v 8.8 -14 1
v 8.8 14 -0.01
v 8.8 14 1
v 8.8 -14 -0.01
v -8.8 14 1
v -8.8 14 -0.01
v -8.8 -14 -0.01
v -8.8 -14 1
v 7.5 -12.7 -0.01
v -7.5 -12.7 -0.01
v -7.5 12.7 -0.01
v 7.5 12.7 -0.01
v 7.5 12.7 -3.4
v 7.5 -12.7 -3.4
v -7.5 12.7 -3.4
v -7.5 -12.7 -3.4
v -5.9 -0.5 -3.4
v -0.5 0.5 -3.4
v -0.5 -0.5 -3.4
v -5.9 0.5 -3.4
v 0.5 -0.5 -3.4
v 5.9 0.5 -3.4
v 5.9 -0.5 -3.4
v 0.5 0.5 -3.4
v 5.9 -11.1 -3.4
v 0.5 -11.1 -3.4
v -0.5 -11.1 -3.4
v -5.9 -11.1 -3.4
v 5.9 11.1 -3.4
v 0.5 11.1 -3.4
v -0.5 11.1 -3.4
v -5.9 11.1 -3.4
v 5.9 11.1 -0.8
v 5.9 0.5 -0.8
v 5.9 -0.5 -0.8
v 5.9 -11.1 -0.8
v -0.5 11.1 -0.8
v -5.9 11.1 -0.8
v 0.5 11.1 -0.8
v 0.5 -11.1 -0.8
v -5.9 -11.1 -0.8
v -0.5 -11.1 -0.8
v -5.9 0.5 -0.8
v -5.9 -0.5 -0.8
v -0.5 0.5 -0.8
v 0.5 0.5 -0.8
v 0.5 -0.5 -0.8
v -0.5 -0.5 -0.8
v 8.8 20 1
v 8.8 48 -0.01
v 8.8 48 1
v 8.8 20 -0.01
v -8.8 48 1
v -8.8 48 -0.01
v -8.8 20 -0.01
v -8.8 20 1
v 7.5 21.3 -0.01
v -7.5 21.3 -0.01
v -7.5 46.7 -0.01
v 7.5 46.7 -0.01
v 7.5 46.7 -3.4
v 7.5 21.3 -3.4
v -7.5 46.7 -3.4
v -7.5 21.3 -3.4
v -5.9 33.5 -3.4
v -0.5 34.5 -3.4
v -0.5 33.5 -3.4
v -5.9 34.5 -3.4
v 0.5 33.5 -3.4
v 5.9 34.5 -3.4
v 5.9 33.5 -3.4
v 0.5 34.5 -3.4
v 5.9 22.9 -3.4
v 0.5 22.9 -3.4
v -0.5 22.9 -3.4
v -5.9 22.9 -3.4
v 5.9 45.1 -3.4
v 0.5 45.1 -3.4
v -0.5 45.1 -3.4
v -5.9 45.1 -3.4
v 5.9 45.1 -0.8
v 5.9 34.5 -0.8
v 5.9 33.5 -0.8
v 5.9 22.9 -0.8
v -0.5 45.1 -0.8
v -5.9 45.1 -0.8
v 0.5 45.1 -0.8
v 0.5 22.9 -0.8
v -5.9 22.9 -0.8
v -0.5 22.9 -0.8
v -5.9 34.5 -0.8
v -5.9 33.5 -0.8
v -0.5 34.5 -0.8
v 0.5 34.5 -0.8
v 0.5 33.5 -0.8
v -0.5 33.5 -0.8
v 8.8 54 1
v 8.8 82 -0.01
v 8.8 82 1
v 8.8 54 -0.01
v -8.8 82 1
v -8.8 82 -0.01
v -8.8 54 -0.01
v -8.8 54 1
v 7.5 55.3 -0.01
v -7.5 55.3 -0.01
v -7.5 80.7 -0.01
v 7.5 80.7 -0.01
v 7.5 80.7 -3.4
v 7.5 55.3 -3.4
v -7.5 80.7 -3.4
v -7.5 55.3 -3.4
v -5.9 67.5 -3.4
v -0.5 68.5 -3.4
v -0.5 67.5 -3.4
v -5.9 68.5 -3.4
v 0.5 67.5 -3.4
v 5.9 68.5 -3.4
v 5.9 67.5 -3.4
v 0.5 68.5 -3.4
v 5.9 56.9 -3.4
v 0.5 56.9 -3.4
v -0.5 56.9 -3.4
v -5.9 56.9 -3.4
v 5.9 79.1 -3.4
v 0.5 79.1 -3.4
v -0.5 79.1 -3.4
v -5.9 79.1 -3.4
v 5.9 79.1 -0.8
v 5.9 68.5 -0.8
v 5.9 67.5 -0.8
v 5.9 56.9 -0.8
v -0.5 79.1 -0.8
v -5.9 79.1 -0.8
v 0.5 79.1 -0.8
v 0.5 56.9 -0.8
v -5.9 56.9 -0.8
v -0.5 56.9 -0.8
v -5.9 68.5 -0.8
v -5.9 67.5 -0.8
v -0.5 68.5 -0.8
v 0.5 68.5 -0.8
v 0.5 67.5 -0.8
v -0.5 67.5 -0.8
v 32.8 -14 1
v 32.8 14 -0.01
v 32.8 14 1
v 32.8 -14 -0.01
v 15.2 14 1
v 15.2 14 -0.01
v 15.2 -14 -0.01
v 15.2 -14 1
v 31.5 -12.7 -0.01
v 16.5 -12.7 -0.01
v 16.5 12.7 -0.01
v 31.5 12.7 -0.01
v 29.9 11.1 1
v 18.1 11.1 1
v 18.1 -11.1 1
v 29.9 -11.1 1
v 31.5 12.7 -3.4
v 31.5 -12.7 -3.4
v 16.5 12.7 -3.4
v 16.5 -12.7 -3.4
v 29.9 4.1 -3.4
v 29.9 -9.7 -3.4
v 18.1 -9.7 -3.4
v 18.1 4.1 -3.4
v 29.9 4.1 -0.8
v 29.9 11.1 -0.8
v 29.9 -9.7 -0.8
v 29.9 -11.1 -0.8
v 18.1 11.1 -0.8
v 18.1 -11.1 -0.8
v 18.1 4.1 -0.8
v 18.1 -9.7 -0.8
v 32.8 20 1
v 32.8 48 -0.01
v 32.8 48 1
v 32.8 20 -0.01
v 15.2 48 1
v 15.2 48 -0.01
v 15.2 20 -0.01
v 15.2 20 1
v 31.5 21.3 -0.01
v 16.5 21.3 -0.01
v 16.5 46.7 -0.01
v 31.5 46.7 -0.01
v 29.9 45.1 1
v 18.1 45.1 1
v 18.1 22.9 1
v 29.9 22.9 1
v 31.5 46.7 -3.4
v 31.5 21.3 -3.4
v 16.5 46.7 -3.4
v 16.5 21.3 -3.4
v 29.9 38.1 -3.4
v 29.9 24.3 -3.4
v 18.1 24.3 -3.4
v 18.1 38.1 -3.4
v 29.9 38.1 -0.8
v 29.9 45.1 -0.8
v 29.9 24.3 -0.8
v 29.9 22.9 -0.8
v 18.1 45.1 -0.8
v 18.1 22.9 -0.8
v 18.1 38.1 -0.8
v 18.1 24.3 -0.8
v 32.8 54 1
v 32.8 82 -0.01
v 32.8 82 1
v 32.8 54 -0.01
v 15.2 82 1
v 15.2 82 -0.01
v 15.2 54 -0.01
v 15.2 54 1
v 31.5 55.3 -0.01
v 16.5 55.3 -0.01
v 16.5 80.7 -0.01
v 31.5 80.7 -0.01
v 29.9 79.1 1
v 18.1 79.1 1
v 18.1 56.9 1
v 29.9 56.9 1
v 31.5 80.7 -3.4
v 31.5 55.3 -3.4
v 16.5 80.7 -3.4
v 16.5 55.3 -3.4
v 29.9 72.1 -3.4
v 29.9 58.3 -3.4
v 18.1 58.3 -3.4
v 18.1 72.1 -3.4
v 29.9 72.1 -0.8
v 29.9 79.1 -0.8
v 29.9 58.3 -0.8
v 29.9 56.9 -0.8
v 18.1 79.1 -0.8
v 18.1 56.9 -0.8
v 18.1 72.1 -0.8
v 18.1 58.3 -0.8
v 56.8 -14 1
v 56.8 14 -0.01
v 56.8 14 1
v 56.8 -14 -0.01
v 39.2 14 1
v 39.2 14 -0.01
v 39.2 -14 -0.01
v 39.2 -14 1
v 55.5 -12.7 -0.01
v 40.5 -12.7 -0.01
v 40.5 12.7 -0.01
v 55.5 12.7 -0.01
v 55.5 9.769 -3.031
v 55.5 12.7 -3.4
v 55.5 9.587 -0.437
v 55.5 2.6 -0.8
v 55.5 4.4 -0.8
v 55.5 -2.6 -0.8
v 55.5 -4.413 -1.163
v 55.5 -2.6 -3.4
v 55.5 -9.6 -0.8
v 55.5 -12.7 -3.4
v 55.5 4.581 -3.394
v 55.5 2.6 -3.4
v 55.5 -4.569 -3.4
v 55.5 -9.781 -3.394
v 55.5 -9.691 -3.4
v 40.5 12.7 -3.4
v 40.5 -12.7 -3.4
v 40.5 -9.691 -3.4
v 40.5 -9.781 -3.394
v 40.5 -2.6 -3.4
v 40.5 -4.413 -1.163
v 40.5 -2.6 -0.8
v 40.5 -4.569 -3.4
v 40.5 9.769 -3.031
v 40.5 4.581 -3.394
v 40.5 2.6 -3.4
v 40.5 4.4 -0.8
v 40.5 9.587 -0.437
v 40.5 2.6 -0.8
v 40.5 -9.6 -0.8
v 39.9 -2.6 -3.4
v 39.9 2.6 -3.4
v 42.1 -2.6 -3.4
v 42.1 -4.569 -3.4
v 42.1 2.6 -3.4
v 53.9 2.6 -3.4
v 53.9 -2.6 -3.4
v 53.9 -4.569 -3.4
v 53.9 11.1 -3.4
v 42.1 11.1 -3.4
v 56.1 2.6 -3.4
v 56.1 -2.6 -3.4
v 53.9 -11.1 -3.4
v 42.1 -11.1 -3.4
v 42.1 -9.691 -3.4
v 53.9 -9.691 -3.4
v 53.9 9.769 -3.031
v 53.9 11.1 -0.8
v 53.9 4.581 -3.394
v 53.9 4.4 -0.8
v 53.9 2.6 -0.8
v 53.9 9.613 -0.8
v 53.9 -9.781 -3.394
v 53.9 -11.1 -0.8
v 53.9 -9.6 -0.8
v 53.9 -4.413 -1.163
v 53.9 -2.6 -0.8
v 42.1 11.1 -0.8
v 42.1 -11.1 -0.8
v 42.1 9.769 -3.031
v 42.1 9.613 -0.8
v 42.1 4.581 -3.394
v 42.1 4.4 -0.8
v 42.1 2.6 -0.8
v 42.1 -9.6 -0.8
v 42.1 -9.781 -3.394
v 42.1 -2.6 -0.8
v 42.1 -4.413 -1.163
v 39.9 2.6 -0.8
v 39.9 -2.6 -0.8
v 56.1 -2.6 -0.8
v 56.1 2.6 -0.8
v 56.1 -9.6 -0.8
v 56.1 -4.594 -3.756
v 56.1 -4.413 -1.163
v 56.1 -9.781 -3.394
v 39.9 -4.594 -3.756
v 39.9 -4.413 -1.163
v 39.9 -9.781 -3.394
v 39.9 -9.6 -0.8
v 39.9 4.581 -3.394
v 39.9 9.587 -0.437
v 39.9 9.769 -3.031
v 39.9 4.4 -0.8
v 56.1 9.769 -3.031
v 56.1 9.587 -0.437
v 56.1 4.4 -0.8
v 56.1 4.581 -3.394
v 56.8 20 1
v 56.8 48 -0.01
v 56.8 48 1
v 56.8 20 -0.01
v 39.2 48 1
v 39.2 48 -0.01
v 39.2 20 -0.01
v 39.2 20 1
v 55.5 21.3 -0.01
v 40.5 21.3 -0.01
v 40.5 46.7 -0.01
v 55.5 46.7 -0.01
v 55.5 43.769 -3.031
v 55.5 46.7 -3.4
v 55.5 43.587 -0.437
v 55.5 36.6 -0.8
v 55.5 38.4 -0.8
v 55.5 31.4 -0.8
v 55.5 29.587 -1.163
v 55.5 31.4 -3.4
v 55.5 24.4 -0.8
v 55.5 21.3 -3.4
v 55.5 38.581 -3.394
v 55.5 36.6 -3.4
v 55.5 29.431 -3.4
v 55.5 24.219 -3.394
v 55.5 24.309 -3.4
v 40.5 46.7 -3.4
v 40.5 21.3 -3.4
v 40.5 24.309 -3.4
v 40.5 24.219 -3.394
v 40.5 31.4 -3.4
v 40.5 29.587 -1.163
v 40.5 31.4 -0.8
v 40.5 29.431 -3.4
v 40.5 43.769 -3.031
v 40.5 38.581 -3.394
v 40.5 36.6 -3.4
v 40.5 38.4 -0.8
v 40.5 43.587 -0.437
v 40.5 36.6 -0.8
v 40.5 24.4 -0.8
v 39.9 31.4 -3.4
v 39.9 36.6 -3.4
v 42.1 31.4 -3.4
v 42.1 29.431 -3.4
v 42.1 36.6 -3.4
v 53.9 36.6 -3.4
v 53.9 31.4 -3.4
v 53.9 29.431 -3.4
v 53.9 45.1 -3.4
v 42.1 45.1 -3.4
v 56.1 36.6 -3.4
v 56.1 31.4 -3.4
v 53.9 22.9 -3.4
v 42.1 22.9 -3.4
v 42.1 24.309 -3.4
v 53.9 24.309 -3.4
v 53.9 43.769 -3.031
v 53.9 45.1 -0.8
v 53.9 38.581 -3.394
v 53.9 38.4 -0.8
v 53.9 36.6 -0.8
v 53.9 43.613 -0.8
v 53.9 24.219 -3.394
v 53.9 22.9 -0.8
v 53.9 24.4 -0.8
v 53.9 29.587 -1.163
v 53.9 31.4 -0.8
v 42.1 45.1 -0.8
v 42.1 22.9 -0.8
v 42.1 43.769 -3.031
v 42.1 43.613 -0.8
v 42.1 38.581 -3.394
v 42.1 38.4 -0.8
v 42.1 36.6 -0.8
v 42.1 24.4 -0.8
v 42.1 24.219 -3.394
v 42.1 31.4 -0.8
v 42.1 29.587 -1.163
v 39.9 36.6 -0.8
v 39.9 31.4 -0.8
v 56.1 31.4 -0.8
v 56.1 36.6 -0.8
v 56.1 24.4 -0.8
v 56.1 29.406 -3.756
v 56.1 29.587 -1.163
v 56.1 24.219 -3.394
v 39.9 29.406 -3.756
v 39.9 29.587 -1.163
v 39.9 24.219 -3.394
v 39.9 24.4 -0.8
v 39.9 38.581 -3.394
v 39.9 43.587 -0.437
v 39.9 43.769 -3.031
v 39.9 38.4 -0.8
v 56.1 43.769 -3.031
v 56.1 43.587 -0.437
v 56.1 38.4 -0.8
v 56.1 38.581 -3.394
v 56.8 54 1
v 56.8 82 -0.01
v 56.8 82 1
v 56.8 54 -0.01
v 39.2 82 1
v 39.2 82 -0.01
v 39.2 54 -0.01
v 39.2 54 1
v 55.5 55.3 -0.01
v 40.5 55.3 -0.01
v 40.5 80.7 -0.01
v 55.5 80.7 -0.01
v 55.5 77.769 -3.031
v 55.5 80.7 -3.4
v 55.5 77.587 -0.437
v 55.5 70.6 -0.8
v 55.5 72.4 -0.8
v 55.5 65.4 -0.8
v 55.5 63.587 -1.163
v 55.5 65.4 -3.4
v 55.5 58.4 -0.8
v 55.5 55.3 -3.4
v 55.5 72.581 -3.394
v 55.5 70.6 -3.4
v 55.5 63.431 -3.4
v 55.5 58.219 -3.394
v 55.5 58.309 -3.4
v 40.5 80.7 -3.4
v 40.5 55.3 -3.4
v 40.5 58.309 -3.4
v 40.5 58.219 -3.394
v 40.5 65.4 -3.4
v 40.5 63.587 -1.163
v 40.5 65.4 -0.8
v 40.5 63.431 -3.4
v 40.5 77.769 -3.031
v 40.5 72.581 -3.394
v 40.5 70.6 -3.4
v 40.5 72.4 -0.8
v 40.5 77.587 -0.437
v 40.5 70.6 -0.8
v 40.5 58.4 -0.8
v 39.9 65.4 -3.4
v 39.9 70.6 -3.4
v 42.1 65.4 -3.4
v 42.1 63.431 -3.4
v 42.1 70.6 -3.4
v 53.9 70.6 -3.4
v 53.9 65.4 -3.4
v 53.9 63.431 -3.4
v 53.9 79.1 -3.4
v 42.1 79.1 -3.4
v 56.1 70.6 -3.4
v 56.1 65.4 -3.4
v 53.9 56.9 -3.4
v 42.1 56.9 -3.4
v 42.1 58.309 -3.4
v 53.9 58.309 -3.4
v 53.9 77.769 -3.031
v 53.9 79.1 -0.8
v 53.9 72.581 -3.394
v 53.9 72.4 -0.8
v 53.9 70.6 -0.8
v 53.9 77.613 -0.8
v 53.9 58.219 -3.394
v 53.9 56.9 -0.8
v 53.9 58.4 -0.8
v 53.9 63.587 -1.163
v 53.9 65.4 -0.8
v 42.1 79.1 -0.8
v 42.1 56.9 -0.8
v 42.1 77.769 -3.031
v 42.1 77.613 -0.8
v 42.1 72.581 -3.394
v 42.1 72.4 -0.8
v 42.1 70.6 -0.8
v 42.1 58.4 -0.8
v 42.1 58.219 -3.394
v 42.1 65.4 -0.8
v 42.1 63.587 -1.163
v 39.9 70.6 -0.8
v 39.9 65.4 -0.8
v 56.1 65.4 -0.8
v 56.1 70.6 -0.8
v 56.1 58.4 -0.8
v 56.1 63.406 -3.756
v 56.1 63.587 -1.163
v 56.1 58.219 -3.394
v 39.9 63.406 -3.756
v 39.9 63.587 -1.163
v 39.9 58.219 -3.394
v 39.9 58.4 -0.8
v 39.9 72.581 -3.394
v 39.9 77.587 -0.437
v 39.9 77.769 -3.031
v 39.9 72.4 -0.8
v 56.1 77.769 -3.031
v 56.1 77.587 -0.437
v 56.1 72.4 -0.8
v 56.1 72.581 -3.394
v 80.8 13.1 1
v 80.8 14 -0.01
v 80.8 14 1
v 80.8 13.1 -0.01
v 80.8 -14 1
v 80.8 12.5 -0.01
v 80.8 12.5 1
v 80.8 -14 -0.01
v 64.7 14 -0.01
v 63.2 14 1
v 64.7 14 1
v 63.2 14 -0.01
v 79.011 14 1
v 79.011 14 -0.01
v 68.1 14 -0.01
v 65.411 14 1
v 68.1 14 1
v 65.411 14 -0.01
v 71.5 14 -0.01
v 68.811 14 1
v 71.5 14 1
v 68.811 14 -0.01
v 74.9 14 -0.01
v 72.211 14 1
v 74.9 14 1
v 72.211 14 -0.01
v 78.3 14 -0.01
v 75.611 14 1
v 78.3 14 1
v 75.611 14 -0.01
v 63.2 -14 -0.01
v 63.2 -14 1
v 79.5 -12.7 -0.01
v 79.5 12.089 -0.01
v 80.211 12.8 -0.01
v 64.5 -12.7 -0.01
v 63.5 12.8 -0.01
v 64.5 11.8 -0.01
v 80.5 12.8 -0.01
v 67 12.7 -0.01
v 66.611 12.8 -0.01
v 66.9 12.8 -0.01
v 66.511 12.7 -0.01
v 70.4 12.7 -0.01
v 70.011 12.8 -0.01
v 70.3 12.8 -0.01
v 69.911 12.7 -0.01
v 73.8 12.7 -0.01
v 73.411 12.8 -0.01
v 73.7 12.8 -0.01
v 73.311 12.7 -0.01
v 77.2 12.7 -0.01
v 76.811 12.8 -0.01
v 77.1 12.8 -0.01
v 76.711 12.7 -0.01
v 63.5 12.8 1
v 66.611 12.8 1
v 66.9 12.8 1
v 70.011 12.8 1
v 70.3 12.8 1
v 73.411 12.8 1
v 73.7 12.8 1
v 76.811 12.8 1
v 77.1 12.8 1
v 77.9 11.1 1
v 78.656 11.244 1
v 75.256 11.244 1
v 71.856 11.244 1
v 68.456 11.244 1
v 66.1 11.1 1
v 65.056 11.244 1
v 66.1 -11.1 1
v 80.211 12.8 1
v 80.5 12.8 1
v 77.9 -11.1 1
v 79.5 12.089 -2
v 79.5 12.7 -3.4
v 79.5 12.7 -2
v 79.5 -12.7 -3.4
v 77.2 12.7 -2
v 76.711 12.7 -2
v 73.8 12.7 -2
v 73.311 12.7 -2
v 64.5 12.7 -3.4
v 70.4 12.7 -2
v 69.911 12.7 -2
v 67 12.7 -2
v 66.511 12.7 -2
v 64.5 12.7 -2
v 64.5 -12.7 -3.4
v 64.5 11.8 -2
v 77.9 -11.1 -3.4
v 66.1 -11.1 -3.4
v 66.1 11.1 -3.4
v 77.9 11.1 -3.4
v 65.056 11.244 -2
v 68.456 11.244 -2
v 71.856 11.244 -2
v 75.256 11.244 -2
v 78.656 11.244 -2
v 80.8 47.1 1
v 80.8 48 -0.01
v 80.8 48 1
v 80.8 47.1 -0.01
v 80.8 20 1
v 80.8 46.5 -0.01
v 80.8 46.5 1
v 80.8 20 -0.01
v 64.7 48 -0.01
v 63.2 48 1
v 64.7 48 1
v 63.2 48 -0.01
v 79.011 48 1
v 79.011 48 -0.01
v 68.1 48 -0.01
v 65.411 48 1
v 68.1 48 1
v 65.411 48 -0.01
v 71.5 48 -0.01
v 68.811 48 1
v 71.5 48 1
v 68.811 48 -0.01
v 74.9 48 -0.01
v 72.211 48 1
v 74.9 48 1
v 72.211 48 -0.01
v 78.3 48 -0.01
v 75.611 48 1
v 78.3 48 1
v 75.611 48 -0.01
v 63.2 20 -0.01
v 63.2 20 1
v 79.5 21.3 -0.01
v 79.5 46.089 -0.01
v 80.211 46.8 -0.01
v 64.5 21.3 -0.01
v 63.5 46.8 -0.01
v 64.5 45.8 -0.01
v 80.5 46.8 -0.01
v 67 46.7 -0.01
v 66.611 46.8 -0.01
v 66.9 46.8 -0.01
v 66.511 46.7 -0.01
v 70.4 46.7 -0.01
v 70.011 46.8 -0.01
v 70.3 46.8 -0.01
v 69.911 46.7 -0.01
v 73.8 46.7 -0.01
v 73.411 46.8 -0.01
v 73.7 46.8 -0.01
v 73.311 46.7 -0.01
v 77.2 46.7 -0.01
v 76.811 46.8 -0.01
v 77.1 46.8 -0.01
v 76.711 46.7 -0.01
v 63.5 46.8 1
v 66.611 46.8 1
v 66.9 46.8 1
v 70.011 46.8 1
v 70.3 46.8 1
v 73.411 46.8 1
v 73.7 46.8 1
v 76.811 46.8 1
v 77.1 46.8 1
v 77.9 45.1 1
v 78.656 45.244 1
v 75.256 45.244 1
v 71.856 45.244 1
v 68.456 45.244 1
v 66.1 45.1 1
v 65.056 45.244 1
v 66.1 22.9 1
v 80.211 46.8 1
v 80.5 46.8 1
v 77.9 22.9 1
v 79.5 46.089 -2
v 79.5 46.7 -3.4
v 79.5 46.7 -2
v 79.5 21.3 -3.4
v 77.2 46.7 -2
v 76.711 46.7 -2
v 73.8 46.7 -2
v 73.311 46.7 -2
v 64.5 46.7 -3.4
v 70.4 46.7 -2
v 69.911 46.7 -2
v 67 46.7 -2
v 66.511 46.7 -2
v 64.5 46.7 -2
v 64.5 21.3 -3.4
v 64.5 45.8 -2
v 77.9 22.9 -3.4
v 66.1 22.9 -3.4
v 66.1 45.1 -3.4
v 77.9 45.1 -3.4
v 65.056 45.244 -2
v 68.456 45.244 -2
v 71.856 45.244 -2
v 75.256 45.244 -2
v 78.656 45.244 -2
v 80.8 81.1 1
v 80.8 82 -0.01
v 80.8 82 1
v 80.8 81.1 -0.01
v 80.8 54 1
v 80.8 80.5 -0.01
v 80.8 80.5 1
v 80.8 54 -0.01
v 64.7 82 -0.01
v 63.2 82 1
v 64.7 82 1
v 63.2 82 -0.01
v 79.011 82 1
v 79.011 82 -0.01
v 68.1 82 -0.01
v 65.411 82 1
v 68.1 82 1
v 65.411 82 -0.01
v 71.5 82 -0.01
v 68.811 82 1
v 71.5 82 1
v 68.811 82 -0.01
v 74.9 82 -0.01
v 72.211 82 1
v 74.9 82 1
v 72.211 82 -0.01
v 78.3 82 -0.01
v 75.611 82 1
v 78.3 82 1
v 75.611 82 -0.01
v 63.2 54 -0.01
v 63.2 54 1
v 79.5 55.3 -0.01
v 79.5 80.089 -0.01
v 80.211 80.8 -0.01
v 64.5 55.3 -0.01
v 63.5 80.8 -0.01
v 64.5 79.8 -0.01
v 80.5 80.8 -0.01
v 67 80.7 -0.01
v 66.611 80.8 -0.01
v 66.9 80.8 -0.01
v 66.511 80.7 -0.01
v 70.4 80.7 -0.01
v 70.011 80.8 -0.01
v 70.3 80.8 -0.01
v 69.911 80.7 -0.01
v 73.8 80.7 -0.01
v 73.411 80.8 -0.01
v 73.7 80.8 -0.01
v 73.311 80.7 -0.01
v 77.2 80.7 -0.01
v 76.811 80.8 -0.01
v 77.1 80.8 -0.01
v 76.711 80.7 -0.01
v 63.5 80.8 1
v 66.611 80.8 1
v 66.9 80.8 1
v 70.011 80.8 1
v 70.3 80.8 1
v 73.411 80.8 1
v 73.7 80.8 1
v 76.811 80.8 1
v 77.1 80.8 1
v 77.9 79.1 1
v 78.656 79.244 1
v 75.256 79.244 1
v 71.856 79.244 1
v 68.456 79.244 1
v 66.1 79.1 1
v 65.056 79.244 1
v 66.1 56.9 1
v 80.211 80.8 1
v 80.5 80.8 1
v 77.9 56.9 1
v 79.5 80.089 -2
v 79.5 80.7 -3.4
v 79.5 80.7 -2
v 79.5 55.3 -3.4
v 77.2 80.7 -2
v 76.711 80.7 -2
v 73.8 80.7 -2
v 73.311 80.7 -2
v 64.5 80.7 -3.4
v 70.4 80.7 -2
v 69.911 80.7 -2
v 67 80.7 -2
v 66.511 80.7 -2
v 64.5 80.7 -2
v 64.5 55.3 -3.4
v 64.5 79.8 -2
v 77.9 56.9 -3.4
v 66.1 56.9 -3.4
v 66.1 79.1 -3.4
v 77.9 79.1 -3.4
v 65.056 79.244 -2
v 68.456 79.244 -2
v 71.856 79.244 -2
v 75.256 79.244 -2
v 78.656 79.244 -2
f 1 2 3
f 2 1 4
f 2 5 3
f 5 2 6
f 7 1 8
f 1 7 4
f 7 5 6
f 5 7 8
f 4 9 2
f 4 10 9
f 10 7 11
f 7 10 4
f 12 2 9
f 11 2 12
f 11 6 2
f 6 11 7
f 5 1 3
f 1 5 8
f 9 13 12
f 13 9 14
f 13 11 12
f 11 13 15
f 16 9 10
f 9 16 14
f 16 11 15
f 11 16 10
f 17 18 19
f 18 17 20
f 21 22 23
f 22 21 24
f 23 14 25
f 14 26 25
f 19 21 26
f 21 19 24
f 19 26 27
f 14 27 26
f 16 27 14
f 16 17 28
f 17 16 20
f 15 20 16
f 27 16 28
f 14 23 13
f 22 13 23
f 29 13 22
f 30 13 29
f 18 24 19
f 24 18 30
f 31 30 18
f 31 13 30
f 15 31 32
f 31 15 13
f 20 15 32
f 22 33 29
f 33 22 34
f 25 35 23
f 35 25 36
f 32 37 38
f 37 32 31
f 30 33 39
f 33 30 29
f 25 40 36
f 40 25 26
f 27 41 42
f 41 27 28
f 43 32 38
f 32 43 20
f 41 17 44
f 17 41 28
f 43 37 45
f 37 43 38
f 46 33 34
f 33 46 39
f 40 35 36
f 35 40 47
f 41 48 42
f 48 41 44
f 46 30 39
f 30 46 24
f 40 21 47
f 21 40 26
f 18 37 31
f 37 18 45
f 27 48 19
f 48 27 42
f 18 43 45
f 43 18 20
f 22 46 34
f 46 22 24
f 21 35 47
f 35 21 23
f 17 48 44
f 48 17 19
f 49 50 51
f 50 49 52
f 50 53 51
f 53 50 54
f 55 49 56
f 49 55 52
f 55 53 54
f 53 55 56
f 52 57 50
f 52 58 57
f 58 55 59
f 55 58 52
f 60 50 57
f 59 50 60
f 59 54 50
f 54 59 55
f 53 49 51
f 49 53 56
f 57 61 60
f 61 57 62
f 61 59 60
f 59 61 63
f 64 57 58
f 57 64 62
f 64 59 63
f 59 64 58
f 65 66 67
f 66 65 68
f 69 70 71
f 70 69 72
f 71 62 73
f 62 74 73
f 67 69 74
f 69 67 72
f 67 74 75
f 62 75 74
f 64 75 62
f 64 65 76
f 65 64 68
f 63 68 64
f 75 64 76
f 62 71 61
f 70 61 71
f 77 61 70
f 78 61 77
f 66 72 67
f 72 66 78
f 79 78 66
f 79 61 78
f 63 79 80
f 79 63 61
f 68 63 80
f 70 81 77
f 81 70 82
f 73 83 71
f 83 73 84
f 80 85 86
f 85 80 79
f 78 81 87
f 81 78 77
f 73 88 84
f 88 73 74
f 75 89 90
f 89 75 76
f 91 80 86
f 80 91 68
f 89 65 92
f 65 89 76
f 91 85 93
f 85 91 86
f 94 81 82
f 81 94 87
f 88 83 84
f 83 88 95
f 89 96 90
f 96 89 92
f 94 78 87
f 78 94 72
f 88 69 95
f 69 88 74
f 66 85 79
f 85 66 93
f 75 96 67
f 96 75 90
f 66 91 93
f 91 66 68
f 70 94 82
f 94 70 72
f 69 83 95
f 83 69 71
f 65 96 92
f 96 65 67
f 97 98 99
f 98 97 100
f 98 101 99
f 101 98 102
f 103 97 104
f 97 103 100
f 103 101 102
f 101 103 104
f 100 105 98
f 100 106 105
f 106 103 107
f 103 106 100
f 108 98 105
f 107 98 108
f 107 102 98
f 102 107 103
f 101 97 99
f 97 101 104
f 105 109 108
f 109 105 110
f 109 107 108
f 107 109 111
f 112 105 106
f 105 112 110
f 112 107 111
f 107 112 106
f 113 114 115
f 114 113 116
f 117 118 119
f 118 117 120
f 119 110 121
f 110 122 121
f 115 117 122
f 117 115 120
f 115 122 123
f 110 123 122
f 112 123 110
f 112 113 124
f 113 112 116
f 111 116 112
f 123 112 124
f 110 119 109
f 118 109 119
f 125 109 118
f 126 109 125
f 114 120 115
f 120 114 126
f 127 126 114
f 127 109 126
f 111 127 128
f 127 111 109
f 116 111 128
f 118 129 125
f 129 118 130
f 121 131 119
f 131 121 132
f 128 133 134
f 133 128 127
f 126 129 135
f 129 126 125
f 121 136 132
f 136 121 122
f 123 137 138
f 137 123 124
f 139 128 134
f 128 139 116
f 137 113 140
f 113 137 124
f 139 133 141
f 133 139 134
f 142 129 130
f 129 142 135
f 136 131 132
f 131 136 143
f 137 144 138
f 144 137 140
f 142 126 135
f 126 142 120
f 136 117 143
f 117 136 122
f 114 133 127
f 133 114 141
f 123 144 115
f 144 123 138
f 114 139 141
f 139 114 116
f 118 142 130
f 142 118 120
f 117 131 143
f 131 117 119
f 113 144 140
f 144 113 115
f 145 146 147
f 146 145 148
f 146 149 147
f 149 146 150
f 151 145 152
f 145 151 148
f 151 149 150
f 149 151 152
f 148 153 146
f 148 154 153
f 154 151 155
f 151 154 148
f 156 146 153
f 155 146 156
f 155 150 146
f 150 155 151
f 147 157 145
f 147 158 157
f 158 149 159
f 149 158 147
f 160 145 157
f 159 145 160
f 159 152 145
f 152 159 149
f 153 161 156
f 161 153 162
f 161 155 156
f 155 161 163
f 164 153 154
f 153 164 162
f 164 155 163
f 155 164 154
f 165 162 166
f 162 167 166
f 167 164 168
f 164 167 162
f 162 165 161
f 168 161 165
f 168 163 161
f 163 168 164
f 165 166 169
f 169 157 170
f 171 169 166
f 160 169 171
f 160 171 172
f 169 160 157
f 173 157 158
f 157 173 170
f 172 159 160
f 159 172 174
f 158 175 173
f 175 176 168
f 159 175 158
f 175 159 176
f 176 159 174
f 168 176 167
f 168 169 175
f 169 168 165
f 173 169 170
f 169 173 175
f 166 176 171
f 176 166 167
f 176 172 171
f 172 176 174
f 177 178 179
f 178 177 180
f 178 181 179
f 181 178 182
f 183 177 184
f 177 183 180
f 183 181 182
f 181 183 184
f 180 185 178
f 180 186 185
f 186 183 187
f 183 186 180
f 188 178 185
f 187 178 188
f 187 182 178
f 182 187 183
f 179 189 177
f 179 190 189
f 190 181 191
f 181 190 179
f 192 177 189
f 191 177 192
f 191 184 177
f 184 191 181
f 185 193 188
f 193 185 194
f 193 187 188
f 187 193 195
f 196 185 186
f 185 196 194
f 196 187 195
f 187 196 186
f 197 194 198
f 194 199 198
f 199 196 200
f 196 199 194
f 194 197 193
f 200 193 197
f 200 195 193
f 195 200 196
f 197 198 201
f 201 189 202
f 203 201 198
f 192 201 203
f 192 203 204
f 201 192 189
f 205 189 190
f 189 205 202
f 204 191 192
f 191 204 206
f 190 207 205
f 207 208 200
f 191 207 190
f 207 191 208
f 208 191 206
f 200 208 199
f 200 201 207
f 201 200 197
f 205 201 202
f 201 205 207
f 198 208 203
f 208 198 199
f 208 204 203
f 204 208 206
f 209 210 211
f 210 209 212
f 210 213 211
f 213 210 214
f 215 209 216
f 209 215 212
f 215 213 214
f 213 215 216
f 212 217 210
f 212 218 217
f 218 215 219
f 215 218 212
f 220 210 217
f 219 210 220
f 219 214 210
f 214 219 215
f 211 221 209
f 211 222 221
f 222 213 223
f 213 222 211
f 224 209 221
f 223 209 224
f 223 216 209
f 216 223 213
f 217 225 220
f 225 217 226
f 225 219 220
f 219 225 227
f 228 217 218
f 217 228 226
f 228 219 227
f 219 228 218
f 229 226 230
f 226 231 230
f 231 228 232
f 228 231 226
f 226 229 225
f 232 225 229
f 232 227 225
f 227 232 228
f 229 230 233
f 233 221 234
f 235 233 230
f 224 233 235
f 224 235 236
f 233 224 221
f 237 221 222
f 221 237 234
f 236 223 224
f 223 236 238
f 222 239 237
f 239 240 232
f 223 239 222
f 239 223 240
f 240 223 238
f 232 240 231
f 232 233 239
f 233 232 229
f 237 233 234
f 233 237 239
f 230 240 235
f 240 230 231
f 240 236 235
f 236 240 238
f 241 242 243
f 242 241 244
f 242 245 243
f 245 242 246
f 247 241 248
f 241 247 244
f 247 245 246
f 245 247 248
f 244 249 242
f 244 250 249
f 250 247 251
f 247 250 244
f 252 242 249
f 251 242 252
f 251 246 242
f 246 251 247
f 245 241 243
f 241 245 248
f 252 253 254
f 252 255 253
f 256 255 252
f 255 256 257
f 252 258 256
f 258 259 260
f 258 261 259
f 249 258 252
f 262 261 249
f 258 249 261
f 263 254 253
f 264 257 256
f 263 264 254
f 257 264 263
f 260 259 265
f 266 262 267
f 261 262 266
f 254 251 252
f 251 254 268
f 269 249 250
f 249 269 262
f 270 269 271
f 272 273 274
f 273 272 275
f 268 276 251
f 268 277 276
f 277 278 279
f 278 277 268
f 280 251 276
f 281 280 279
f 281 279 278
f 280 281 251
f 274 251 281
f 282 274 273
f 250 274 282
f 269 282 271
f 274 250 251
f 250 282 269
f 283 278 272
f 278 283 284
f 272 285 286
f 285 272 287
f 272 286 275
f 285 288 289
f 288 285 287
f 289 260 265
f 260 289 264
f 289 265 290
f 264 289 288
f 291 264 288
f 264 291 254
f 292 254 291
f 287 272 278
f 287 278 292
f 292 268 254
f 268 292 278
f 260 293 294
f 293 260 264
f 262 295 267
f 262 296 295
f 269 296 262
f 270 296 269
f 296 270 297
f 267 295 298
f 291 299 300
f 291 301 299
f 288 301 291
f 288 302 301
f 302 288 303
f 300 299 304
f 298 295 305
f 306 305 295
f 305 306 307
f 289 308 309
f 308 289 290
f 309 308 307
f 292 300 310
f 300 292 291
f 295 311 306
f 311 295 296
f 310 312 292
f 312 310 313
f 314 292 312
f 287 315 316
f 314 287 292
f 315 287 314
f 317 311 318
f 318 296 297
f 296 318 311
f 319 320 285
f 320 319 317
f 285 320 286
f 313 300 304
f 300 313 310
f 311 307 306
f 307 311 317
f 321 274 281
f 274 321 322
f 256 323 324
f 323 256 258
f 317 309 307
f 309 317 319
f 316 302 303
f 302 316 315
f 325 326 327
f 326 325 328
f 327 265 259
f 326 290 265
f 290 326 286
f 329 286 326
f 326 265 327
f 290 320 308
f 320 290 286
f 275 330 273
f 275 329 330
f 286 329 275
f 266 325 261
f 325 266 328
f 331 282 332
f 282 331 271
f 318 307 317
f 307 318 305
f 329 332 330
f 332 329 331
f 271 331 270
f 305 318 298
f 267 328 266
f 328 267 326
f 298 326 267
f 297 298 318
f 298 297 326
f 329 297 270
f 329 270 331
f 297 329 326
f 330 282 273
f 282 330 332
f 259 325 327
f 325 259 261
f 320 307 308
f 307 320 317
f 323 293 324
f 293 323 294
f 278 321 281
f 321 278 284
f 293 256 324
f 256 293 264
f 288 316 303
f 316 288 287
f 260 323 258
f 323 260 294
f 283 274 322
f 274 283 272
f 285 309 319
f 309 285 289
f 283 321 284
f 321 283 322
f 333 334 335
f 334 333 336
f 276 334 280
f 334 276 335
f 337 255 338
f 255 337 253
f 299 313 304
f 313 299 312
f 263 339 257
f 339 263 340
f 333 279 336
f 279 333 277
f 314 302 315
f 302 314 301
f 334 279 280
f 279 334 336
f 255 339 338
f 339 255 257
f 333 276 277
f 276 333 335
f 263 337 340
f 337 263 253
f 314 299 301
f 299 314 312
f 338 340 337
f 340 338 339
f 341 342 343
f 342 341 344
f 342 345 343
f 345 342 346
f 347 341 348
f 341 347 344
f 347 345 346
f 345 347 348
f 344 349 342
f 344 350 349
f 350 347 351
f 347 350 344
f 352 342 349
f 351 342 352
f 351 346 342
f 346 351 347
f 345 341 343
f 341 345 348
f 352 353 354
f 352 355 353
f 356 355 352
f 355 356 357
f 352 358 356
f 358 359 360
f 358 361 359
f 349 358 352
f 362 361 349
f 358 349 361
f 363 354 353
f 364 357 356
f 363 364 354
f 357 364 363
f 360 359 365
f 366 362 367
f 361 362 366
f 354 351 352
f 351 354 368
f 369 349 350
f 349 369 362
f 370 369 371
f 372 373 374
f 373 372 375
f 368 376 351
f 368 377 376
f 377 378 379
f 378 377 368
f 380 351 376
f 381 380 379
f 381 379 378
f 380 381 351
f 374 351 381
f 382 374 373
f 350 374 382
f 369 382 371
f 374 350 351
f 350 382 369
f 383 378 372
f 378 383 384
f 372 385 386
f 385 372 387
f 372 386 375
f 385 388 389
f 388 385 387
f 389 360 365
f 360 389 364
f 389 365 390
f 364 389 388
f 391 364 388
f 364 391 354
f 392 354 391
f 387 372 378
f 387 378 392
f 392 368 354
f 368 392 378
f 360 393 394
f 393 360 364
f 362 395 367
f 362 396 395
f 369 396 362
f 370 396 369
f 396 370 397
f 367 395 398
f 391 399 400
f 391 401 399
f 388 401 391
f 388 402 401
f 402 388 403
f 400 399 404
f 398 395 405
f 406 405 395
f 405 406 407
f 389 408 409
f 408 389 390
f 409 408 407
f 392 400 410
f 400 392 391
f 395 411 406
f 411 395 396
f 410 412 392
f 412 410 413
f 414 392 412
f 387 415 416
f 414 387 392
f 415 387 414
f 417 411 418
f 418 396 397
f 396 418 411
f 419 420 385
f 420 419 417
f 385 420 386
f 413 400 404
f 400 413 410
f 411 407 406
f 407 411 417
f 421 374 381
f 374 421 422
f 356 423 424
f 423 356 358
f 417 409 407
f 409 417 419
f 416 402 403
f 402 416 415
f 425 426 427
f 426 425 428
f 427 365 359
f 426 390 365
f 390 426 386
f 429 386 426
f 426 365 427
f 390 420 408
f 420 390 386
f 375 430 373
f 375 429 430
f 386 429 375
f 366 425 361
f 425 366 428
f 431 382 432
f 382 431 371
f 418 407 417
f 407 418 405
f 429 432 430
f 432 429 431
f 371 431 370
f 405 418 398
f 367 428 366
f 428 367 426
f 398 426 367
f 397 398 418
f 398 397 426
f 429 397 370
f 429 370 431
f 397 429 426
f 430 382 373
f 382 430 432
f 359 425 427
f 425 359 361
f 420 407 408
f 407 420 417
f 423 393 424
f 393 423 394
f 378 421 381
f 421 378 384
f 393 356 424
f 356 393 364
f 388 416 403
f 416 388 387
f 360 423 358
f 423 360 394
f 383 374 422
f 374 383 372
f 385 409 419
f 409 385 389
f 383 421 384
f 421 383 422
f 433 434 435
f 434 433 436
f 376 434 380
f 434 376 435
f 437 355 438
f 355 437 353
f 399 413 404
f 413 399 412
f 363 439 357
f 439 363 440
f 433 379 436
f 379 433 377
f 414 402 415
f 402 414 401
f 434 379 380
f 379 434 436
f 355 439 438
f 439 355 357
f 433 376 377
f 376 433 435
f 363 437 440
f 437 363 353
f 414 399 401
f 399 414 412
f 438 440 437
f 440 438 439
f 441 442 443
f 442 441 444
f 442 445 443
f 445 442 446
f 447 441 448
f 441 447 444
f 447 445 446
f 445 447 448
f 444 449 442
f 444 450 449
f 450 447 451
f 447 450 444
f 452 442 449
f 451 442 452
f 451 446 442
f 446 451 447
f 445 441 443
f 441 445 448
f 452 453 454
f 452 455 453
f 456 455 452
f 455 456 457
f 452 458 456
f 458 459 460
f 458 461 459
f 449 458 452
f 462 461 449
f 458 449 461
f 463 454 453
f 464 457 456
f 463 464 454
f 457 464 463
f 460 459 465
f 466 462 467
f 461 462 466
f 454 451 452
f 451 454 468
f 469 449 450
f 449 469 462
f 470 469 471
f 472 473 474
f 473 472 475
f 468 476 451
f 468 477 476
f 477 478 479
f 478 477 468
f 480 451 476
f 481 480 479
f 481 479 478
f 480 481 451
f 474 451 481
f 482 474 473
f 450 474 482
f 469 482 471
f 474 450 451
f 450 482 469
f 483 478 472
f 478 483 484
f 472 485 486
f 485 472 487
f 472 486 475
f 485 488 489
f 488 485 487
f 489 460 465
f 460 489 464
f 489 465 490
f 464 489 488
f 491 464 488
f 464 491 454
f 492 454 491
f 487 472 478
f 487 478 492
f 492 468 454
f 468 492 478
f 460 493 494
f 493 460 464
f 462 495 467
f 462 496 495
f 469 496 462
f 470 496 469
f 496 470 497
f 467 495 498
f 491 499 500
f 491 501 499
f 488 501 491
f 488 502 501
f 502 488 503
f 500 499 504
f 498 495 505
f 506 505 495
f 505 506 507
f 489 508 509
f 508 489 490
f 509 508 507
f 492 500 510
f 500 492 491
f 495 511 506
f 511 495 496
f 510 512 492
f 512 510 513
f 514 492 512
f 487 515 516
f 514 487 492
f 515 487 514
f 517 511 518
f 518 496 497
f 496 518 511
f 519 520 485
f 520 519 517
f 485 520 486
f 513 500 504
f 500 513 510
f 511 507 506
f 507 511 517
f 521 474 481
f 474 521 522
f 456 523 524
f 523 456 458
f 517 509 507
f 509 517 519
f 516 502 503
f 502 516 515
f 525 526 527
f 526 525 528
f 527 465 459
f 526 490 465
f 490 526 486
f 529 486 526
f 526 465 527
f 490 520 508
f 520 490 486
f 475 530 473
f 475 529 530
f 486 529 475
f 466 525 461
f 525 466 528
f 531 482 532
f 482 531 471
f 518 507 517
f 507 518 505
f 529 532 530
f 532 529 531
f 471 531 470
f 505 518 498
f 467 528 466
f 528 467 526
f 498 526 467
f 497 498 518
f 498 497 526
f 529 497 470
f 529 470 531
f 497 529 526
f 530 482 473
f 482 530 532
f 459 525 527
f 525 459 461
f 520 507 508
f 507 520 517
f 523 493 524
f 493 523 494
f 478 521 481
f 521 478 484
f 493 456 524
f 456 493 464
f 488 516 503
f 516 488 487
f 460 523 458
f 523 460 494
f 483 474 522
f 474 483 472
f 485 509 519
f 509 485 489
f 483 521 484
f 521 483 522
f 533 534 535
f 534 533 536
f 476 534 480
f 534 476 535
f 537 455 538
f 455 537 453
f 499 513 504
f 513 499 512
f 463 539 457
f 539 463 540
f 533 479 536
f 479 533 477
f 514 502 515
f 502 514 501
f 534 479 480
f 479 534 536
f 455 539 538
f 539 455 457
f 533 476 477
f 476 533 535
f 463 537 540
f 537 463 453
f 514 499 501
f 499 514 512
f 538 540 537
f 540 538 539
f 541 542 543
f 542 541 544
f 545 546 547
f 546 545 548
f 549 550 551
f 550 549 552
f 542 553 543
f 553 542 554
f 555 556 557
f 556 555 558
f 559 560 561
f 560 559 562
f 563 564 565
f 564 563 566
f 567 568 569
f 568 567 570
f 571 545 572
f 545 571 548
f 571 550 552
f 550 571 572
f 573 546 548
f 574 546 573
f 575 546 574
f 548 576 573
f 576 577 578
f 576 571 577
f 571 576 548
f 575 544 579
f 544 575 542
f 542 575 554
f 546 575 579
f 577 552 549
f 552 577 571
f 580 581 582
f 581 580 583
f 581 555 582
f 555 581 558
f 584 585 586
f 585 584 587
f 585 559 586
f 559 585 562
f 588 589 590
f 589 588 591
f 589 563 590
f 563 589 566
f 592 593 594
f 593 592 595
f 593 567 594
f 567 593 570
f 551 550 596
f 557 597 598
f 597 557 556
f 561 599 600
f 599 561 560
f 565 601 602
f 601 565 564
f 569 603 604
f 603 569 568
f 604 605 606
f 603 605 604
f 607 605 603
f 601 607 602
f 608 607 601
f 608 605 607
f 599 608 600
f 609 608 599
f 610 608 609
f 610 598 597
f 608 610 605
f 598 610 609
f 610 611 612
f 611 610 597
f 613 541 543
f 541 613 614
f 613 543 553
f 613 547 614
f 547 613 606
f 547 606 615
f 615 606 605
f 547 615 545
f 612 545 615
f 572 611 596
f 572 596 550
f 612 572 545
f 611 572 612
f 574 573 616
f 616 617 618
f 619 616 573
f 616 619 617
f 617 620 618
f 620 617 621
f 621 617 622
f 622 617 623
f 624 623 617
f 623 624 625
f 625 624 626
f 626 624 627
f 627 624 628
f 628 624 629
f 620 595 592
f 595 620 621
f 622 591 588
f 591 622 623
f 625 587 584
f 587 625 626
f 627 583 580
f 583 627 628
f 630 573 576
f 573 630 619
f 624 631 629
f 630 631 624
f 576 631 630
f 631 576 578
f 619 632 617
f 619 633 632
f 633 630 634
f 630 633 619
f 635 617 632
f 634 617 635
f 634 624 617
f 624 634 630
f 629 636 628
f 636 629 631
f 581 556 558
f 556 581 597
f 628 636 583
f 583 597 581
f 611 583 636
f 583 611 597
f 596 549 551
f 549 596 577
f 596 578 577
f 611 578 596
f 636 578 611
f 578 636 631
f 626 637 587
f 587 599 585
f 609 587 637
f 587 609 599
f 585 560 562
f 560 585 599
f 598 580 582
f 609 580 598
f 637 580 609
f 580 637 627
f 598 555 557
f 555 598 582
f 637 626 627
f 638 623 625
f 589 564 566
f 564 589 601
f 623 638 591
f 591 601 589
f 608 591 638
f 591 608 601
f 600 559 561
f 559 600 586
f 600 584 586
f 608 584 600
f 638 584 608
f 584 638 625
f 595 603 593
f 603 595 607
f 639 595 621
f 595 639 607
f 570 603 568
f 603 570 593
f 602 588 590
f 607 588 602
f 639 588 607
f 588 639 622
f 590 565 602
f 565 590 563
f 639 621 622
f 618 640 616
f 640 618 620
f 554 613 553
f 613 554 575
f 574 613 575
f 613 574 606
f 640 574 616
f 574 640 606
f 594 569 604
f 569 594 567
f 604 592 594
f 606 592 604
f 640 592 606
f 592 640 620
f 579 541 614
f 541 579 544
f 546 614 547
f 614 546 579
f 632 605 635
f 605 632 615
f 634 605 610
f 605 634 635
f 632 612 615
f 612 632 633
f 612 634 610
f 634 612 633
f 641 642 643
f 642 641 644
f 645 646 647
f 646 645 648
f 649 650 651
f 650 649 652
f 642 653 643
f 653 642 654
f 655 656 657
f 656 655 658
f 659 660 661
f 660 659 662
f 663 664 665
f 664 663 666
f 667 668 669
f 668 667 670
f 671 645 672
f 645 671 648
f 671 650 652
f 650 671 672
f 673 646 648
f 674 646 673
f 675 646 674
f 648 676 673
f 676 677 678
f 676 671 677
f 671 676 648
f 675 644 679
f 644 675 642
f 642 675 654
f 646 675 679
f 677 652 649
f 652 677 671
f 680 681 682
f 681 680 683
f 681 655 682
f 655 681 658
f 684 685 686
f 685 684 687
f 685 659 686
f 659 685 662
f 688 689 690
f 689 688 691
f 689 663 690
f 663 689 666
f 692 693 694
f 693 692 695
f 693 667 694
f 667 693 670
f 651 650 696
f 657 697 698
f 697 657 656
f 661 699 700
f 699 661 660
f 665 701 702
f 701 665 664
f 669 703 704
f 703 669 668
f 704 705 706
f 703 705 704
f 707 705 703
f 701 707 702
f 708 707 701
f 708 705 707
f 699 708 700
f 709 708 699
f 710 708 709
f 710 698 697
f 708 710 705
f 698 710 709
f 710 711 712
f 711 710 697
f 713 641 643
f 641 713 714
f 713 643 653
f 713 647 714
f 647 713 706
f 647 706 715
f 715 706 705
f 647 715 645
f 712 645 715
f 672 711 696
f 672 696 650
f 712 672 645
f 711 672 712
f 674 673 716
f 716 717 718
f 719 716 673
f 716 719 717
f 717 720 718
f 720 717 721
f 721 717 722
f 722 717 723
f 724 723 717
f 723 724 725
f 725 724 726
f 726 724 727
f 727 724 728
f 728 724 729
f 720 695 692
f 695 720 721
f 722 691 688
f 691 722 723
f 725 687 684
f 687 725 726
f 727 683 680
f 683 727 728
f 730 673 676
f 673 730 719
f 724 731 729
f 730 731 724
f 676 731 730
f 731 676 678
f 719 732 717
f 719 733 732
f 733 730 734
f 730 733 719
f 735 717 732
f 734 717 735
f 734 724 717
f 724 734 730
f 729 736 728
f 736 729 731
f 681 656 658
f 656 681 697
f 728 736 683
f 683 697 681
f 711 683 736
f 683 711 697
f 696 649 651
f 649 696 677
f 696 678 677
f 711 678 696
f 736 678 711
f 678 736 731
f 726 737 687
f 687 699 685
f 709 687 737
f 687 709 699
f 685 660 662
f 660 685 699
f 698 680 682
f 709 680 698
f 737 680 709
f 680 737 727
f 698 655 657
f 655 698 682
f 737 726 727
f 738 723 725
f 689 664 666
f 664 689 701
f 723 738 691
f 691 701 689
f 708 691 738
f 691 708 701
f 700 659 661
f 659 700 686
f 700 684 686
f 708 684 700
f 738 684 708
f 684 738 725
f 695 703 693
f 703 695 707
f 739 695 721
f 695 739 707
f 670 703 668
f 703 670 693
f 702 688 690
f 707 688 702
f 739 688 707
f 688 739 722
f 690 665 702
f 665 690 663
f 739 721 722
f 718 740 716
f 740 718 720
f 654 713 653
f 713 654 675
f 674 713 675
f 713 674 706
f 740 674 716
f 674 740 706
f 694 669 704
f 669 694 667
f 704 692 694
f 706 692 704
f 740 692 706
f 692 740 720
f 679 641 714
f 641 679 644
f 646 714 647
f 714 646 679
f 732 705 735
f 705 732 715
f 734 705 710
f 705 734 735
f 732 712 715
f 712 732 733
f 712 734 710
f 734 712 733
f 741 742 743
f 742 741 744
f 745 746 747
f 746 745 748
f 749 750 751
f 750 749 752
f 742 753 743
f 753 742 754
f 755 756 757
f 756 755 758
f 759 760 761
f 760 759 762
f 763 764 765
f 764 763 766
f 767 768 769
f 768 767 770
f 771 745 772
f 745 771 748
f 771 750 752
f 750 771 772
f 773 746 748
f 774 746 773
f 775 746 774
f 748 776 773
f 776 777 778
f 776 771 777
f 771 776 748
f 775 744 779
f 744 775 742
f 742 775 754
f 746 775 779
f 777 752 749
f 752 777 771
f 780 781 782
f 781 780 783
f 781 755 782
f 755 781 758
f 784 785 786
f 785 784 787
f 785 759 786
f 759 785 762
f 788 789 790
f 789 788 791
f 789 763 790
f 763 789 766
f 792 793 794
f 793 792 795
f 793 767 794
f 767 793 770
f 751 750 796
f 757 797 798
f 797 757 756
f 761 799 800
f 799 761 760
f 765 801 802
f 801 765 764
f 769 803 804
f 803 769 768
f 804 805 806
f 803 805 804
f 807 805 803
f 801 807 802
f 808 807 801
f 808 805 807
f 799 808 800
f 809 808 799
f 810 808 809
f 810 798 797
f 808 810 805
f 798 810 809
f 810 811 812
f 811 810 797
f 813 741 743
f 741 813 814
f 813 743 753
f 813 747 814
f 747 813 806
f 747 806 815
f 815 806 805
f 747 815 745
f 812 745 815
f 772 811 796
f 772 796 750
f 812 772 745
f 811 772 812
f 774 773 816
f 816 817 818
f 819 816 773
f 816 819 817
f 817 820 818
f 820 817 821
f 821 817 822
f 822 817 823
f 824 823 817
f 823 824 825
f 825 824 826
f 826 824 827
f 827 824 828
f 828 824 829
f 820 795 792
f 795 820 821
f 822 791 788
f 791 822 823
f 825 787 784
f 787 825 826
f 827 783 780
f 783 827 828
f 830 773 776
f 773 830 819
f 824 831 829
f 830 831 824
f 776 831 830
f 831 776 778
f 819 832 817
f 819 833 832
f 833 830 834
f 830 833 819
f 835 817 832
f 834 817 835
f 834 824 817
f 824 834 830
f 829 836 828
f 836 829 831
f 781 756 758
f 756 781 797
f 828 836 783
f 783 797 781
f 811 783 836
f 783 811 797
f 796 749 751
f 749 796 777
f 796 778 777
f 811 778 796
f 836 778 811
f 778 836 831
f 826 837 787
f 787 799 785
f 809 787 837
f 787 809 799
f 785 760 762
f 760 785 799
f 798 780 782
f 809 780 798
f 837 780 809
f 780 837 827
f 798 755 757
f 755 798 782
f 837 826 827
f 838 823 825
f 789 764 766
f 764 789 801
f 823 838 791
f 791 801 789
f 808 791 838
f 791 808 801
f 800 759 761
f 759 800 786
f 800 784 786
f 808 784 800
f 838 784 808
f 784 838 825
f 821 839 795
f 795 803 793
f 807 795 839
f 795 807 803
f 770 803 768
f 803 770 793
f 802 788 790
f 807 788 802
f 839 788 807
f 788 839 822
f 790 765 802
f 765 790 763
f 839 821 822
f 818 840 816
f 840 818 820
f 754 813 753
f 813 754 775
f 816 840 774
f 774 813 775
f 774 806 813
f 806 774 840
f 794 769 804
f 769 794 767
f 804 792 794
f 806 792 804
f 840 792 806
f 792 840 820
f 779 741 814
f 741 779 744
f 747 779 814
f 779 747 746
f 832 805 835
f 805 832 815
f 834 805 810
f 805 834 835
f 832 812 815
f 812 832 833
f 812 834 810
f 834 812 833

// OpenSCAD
// ============================================================
// POP-IN WINDOW INSERTS  for Fallout Terrain "Urban House B Suburbia"
// (and any wall with a ~15.5 x 25.9mm aperture)
//
// WHY THIS IS EASY: the pack already ships "NO WINDOWS" wall files. Despite
// the name those are not solid walls - they are the walls WITH the window
// apertures open and the frame moulding already in place; only the glazing
// is missing. So no mesh surgery is needed at all. We just make plugs.
//
// MEASURED FROM THE SUPPLIED MESHES (slice analysis, not guesswork):
//   aperture   15.1 - 16.0 mm wide  x  25.9 mm tall
//   sill z = 13.8, head z = 39.8, wall thickness ~5.2mm
// The 0.9mm spread across walls is either real variation or slicing noise,
// so PRINT THE TEST COUPON FIRST (show="coupon") to find the size that
// actually seats, then set plug_w and print the real inserts.
//
// Each insert is a PLUG that fills the aperture plus a FLANGE that stops it
// pushing through and hides any slop. Flange goes on the OUTSIDE face.
// Swap inserts to change a building's state mid-game.
// ============================================================

/* [Show] */
show = "plate";   // plate | coupon | single
style = "glazed"; // glazed | open | boarded | blown

/* [Aperture - from the measured meshes] */
ap_w   = 15.5;
ap_h   = 25.9;
wall_t = 5.2;

/* [Fit] */
plug_w    = 15.0;   // set from the coupon result
plug_h    = 25.4;
plug_t    = 3.4;    // shorter than wall_t so it never bottoms out
flange_o  = 1.3;    // flange oversize per side
flange_t  = 1.0;

/* [Detail] */
bar_w   = 1.0;      // muntin bars
frame_w = 1.6;      // inner frame around the pane
pane_t  = 0.8;

$fn = 20;

// ---------- shared body ----------
module plug_body() {
    // flange sits proud on the outside (-Y), plug goes into +Y
    translate([-(plug_w/2 + flange_o), -flange_t, -(plug_h/2 + flange_o)])
        cube([plug_w + 2*flange_o, flange_t + 0.01, plug_h + 2*flange_o]);
    translate([-plug_w/2, 0, -plug_h/2]) cube([plug_w, plug_t, plug_h]);
}

// ---------- styles ----------
// closed window: pane with a cross of muntin bars
module s_glazed() {
    difference() {
        plug_body();
        // hollow out the pane area, leaving a thin backing
        translate([-plug_w/2 + frame_w, pane_t, -plug_h/2 + frame_w])
            cube([plug_w - 2*frame_w, plug_t, plug_h - 2*frame_w]);
    }
    // muntins across the opening
    translate([-bar_w/2, pane_t, -plug_h/2 + frame_w])
        cube([bar_w, plug_t - pane_t, plug_h - 2*frame_w]);
    translate([-plug_w/2 + frame_w, pane_t, -bar_w/2])
        cube([plug_w - 2*frame_w, plug_t - pane_t, bar_w]);
}

// open window: sash slid up, so the lower half is a clear void
module s_open() {
    difference() {
        plug_body();
        translate([-plug_w/2 + frame_w, -flange_t - 1, -plug_h/2 + frame_w])
            cube([plug_w - 2*frame_w, plug_t + flange_t + 2, plug_h - 2*frame_w]);
    }
    // raised sash bunched at the top
    translate([-plug_w/2 + frame_w, pane_t, plug_h/2 - frame_w - 7])
        cube([plug_w - 2*frame_w, plug_t - pane_t, 7]);
    translate([-bar_w/2, pane_t, plug_h/2 - frame_w - 7])
        cube([bar_w, plug_t - pane_t, 7]);
    // sill lip at the bottom of the void
    translate([-plug_w/2 + frame_w, pane_t, -plug_h/2 + frame_w])
        cube([plug_w - 2*frame_w, plug_t - pane_t, 1.4]);
}

// boarded up: planks nailed across
module s_boarded() {
    difference() {
        plug_body();
        translate([-plug_w/2 + frame_w, pane_t, -plug_h/2 + frame_w])
            cube([plug_w - 2*frame_w, plug_t, plug_h - 2*frame_w]);
    }
    for (i = [-1, 0, 1])
        translate([-plug_w/2 - 0.6, pane_t, i*7 - 2.6])
            rotate([0, 0, 0]) rotate([i*4, 0, 0])
                cube([plug_w + 1.2, plug_t - pane_t, 5.2]);
}

// blown out: jagged remains of a frame, mostly void
module s_blown() {
    difference() {
        union() {
            plug_body();
            // a couple of glass shards clinging to the frame
            translate([-plug_w/2 + frame_w, pane_t, plug_h/2 - frame_w - 5])
                cube([4.5, plug_t - pane_t, 5]);
            translate([plug_w/2 - frame_w - 3.5, pane_t, plug_h/2 - frame_w - 8])
                cube([3.5, plug_t - pane_t, 8]);
        }
        translate([-plug_w/2 + frame_w, -flange_t - 1, -plug_h/2 + frame_w])
            cube([plug_w - 2*frame_w, plug_t + flange_t + 2, plug_h - 2*frame_w]);
        // chew the flange edge so it reads as damaged
        for (a = [0 : 5])
            translate([-plug_w/2 + a*3.4 - 1, -flange_t - 1, plug_h/2 + flange_o - 1.2])
                rotate([0, 45, 0]) cube([2.2, flange_t + 3, 2.2]);
    }
}

module insert(s) {
    if      (s == "open")    s_open();
    else if (s == "boarded") s_boarded();
    else if (s == "blown")   s_blown();
    else                     s_glazed();
}

// ---------- print layouts ----------
// lay flat: flange face down on the bed, plug pointing up. No supports.
module flat(s) rotate([-90, 0, 0]) insert(s);

module plate() {
    styles = ["glazed", "open", "boarded", "blown"];
    for (i = [0 : 3]) for (j = [0 : 2])
        translate([i*24, j*34, 0]) flat(styles[i]);
}

// Test coupon: four plug widths so you can find the real fit before
// committing to a full set. Widths are engraved as notch counts on the
// flange edge - 1 notch = smallest.
module coupon() {
    widths = [14.6, 15.0, 15.4, 15.8];
    for (i = [0 : 3])
        translate([i*24, 0, 0]) {
            rotate([-90, 0, 0]) difference() {
                union() {
                    translate([-(widths[i]/2 + flange_o), -flange_t,
                               -(plug_h/2 + flange_o)])
                        cube([widths[i] + 2*flange_o, flange_t + 0.01,
                              plug_h + 2*flange_o]);
                    translate([-widths[i]/2, 0, -plug_h/2])
                        cube([widths[i], plug_t, plug_h]);
                }
                // identifying notches
                for (k = [0 : i])
                    translate([-widths[i]/2 + 1.5 + k*2.2, -flange_t - 0.5,
                               -plug_h/2 - flange_o - 0.5])
                        cube([1.2, flange_t + 1, 1.6]);
            }
        }
}

// set false when this file is `include`d by a fit-check script
render_top = true;
if (render_top) {
    if      (show == "coupon") coupon();
    else if (show == "single") flat(style);
    else                       plate();
}
